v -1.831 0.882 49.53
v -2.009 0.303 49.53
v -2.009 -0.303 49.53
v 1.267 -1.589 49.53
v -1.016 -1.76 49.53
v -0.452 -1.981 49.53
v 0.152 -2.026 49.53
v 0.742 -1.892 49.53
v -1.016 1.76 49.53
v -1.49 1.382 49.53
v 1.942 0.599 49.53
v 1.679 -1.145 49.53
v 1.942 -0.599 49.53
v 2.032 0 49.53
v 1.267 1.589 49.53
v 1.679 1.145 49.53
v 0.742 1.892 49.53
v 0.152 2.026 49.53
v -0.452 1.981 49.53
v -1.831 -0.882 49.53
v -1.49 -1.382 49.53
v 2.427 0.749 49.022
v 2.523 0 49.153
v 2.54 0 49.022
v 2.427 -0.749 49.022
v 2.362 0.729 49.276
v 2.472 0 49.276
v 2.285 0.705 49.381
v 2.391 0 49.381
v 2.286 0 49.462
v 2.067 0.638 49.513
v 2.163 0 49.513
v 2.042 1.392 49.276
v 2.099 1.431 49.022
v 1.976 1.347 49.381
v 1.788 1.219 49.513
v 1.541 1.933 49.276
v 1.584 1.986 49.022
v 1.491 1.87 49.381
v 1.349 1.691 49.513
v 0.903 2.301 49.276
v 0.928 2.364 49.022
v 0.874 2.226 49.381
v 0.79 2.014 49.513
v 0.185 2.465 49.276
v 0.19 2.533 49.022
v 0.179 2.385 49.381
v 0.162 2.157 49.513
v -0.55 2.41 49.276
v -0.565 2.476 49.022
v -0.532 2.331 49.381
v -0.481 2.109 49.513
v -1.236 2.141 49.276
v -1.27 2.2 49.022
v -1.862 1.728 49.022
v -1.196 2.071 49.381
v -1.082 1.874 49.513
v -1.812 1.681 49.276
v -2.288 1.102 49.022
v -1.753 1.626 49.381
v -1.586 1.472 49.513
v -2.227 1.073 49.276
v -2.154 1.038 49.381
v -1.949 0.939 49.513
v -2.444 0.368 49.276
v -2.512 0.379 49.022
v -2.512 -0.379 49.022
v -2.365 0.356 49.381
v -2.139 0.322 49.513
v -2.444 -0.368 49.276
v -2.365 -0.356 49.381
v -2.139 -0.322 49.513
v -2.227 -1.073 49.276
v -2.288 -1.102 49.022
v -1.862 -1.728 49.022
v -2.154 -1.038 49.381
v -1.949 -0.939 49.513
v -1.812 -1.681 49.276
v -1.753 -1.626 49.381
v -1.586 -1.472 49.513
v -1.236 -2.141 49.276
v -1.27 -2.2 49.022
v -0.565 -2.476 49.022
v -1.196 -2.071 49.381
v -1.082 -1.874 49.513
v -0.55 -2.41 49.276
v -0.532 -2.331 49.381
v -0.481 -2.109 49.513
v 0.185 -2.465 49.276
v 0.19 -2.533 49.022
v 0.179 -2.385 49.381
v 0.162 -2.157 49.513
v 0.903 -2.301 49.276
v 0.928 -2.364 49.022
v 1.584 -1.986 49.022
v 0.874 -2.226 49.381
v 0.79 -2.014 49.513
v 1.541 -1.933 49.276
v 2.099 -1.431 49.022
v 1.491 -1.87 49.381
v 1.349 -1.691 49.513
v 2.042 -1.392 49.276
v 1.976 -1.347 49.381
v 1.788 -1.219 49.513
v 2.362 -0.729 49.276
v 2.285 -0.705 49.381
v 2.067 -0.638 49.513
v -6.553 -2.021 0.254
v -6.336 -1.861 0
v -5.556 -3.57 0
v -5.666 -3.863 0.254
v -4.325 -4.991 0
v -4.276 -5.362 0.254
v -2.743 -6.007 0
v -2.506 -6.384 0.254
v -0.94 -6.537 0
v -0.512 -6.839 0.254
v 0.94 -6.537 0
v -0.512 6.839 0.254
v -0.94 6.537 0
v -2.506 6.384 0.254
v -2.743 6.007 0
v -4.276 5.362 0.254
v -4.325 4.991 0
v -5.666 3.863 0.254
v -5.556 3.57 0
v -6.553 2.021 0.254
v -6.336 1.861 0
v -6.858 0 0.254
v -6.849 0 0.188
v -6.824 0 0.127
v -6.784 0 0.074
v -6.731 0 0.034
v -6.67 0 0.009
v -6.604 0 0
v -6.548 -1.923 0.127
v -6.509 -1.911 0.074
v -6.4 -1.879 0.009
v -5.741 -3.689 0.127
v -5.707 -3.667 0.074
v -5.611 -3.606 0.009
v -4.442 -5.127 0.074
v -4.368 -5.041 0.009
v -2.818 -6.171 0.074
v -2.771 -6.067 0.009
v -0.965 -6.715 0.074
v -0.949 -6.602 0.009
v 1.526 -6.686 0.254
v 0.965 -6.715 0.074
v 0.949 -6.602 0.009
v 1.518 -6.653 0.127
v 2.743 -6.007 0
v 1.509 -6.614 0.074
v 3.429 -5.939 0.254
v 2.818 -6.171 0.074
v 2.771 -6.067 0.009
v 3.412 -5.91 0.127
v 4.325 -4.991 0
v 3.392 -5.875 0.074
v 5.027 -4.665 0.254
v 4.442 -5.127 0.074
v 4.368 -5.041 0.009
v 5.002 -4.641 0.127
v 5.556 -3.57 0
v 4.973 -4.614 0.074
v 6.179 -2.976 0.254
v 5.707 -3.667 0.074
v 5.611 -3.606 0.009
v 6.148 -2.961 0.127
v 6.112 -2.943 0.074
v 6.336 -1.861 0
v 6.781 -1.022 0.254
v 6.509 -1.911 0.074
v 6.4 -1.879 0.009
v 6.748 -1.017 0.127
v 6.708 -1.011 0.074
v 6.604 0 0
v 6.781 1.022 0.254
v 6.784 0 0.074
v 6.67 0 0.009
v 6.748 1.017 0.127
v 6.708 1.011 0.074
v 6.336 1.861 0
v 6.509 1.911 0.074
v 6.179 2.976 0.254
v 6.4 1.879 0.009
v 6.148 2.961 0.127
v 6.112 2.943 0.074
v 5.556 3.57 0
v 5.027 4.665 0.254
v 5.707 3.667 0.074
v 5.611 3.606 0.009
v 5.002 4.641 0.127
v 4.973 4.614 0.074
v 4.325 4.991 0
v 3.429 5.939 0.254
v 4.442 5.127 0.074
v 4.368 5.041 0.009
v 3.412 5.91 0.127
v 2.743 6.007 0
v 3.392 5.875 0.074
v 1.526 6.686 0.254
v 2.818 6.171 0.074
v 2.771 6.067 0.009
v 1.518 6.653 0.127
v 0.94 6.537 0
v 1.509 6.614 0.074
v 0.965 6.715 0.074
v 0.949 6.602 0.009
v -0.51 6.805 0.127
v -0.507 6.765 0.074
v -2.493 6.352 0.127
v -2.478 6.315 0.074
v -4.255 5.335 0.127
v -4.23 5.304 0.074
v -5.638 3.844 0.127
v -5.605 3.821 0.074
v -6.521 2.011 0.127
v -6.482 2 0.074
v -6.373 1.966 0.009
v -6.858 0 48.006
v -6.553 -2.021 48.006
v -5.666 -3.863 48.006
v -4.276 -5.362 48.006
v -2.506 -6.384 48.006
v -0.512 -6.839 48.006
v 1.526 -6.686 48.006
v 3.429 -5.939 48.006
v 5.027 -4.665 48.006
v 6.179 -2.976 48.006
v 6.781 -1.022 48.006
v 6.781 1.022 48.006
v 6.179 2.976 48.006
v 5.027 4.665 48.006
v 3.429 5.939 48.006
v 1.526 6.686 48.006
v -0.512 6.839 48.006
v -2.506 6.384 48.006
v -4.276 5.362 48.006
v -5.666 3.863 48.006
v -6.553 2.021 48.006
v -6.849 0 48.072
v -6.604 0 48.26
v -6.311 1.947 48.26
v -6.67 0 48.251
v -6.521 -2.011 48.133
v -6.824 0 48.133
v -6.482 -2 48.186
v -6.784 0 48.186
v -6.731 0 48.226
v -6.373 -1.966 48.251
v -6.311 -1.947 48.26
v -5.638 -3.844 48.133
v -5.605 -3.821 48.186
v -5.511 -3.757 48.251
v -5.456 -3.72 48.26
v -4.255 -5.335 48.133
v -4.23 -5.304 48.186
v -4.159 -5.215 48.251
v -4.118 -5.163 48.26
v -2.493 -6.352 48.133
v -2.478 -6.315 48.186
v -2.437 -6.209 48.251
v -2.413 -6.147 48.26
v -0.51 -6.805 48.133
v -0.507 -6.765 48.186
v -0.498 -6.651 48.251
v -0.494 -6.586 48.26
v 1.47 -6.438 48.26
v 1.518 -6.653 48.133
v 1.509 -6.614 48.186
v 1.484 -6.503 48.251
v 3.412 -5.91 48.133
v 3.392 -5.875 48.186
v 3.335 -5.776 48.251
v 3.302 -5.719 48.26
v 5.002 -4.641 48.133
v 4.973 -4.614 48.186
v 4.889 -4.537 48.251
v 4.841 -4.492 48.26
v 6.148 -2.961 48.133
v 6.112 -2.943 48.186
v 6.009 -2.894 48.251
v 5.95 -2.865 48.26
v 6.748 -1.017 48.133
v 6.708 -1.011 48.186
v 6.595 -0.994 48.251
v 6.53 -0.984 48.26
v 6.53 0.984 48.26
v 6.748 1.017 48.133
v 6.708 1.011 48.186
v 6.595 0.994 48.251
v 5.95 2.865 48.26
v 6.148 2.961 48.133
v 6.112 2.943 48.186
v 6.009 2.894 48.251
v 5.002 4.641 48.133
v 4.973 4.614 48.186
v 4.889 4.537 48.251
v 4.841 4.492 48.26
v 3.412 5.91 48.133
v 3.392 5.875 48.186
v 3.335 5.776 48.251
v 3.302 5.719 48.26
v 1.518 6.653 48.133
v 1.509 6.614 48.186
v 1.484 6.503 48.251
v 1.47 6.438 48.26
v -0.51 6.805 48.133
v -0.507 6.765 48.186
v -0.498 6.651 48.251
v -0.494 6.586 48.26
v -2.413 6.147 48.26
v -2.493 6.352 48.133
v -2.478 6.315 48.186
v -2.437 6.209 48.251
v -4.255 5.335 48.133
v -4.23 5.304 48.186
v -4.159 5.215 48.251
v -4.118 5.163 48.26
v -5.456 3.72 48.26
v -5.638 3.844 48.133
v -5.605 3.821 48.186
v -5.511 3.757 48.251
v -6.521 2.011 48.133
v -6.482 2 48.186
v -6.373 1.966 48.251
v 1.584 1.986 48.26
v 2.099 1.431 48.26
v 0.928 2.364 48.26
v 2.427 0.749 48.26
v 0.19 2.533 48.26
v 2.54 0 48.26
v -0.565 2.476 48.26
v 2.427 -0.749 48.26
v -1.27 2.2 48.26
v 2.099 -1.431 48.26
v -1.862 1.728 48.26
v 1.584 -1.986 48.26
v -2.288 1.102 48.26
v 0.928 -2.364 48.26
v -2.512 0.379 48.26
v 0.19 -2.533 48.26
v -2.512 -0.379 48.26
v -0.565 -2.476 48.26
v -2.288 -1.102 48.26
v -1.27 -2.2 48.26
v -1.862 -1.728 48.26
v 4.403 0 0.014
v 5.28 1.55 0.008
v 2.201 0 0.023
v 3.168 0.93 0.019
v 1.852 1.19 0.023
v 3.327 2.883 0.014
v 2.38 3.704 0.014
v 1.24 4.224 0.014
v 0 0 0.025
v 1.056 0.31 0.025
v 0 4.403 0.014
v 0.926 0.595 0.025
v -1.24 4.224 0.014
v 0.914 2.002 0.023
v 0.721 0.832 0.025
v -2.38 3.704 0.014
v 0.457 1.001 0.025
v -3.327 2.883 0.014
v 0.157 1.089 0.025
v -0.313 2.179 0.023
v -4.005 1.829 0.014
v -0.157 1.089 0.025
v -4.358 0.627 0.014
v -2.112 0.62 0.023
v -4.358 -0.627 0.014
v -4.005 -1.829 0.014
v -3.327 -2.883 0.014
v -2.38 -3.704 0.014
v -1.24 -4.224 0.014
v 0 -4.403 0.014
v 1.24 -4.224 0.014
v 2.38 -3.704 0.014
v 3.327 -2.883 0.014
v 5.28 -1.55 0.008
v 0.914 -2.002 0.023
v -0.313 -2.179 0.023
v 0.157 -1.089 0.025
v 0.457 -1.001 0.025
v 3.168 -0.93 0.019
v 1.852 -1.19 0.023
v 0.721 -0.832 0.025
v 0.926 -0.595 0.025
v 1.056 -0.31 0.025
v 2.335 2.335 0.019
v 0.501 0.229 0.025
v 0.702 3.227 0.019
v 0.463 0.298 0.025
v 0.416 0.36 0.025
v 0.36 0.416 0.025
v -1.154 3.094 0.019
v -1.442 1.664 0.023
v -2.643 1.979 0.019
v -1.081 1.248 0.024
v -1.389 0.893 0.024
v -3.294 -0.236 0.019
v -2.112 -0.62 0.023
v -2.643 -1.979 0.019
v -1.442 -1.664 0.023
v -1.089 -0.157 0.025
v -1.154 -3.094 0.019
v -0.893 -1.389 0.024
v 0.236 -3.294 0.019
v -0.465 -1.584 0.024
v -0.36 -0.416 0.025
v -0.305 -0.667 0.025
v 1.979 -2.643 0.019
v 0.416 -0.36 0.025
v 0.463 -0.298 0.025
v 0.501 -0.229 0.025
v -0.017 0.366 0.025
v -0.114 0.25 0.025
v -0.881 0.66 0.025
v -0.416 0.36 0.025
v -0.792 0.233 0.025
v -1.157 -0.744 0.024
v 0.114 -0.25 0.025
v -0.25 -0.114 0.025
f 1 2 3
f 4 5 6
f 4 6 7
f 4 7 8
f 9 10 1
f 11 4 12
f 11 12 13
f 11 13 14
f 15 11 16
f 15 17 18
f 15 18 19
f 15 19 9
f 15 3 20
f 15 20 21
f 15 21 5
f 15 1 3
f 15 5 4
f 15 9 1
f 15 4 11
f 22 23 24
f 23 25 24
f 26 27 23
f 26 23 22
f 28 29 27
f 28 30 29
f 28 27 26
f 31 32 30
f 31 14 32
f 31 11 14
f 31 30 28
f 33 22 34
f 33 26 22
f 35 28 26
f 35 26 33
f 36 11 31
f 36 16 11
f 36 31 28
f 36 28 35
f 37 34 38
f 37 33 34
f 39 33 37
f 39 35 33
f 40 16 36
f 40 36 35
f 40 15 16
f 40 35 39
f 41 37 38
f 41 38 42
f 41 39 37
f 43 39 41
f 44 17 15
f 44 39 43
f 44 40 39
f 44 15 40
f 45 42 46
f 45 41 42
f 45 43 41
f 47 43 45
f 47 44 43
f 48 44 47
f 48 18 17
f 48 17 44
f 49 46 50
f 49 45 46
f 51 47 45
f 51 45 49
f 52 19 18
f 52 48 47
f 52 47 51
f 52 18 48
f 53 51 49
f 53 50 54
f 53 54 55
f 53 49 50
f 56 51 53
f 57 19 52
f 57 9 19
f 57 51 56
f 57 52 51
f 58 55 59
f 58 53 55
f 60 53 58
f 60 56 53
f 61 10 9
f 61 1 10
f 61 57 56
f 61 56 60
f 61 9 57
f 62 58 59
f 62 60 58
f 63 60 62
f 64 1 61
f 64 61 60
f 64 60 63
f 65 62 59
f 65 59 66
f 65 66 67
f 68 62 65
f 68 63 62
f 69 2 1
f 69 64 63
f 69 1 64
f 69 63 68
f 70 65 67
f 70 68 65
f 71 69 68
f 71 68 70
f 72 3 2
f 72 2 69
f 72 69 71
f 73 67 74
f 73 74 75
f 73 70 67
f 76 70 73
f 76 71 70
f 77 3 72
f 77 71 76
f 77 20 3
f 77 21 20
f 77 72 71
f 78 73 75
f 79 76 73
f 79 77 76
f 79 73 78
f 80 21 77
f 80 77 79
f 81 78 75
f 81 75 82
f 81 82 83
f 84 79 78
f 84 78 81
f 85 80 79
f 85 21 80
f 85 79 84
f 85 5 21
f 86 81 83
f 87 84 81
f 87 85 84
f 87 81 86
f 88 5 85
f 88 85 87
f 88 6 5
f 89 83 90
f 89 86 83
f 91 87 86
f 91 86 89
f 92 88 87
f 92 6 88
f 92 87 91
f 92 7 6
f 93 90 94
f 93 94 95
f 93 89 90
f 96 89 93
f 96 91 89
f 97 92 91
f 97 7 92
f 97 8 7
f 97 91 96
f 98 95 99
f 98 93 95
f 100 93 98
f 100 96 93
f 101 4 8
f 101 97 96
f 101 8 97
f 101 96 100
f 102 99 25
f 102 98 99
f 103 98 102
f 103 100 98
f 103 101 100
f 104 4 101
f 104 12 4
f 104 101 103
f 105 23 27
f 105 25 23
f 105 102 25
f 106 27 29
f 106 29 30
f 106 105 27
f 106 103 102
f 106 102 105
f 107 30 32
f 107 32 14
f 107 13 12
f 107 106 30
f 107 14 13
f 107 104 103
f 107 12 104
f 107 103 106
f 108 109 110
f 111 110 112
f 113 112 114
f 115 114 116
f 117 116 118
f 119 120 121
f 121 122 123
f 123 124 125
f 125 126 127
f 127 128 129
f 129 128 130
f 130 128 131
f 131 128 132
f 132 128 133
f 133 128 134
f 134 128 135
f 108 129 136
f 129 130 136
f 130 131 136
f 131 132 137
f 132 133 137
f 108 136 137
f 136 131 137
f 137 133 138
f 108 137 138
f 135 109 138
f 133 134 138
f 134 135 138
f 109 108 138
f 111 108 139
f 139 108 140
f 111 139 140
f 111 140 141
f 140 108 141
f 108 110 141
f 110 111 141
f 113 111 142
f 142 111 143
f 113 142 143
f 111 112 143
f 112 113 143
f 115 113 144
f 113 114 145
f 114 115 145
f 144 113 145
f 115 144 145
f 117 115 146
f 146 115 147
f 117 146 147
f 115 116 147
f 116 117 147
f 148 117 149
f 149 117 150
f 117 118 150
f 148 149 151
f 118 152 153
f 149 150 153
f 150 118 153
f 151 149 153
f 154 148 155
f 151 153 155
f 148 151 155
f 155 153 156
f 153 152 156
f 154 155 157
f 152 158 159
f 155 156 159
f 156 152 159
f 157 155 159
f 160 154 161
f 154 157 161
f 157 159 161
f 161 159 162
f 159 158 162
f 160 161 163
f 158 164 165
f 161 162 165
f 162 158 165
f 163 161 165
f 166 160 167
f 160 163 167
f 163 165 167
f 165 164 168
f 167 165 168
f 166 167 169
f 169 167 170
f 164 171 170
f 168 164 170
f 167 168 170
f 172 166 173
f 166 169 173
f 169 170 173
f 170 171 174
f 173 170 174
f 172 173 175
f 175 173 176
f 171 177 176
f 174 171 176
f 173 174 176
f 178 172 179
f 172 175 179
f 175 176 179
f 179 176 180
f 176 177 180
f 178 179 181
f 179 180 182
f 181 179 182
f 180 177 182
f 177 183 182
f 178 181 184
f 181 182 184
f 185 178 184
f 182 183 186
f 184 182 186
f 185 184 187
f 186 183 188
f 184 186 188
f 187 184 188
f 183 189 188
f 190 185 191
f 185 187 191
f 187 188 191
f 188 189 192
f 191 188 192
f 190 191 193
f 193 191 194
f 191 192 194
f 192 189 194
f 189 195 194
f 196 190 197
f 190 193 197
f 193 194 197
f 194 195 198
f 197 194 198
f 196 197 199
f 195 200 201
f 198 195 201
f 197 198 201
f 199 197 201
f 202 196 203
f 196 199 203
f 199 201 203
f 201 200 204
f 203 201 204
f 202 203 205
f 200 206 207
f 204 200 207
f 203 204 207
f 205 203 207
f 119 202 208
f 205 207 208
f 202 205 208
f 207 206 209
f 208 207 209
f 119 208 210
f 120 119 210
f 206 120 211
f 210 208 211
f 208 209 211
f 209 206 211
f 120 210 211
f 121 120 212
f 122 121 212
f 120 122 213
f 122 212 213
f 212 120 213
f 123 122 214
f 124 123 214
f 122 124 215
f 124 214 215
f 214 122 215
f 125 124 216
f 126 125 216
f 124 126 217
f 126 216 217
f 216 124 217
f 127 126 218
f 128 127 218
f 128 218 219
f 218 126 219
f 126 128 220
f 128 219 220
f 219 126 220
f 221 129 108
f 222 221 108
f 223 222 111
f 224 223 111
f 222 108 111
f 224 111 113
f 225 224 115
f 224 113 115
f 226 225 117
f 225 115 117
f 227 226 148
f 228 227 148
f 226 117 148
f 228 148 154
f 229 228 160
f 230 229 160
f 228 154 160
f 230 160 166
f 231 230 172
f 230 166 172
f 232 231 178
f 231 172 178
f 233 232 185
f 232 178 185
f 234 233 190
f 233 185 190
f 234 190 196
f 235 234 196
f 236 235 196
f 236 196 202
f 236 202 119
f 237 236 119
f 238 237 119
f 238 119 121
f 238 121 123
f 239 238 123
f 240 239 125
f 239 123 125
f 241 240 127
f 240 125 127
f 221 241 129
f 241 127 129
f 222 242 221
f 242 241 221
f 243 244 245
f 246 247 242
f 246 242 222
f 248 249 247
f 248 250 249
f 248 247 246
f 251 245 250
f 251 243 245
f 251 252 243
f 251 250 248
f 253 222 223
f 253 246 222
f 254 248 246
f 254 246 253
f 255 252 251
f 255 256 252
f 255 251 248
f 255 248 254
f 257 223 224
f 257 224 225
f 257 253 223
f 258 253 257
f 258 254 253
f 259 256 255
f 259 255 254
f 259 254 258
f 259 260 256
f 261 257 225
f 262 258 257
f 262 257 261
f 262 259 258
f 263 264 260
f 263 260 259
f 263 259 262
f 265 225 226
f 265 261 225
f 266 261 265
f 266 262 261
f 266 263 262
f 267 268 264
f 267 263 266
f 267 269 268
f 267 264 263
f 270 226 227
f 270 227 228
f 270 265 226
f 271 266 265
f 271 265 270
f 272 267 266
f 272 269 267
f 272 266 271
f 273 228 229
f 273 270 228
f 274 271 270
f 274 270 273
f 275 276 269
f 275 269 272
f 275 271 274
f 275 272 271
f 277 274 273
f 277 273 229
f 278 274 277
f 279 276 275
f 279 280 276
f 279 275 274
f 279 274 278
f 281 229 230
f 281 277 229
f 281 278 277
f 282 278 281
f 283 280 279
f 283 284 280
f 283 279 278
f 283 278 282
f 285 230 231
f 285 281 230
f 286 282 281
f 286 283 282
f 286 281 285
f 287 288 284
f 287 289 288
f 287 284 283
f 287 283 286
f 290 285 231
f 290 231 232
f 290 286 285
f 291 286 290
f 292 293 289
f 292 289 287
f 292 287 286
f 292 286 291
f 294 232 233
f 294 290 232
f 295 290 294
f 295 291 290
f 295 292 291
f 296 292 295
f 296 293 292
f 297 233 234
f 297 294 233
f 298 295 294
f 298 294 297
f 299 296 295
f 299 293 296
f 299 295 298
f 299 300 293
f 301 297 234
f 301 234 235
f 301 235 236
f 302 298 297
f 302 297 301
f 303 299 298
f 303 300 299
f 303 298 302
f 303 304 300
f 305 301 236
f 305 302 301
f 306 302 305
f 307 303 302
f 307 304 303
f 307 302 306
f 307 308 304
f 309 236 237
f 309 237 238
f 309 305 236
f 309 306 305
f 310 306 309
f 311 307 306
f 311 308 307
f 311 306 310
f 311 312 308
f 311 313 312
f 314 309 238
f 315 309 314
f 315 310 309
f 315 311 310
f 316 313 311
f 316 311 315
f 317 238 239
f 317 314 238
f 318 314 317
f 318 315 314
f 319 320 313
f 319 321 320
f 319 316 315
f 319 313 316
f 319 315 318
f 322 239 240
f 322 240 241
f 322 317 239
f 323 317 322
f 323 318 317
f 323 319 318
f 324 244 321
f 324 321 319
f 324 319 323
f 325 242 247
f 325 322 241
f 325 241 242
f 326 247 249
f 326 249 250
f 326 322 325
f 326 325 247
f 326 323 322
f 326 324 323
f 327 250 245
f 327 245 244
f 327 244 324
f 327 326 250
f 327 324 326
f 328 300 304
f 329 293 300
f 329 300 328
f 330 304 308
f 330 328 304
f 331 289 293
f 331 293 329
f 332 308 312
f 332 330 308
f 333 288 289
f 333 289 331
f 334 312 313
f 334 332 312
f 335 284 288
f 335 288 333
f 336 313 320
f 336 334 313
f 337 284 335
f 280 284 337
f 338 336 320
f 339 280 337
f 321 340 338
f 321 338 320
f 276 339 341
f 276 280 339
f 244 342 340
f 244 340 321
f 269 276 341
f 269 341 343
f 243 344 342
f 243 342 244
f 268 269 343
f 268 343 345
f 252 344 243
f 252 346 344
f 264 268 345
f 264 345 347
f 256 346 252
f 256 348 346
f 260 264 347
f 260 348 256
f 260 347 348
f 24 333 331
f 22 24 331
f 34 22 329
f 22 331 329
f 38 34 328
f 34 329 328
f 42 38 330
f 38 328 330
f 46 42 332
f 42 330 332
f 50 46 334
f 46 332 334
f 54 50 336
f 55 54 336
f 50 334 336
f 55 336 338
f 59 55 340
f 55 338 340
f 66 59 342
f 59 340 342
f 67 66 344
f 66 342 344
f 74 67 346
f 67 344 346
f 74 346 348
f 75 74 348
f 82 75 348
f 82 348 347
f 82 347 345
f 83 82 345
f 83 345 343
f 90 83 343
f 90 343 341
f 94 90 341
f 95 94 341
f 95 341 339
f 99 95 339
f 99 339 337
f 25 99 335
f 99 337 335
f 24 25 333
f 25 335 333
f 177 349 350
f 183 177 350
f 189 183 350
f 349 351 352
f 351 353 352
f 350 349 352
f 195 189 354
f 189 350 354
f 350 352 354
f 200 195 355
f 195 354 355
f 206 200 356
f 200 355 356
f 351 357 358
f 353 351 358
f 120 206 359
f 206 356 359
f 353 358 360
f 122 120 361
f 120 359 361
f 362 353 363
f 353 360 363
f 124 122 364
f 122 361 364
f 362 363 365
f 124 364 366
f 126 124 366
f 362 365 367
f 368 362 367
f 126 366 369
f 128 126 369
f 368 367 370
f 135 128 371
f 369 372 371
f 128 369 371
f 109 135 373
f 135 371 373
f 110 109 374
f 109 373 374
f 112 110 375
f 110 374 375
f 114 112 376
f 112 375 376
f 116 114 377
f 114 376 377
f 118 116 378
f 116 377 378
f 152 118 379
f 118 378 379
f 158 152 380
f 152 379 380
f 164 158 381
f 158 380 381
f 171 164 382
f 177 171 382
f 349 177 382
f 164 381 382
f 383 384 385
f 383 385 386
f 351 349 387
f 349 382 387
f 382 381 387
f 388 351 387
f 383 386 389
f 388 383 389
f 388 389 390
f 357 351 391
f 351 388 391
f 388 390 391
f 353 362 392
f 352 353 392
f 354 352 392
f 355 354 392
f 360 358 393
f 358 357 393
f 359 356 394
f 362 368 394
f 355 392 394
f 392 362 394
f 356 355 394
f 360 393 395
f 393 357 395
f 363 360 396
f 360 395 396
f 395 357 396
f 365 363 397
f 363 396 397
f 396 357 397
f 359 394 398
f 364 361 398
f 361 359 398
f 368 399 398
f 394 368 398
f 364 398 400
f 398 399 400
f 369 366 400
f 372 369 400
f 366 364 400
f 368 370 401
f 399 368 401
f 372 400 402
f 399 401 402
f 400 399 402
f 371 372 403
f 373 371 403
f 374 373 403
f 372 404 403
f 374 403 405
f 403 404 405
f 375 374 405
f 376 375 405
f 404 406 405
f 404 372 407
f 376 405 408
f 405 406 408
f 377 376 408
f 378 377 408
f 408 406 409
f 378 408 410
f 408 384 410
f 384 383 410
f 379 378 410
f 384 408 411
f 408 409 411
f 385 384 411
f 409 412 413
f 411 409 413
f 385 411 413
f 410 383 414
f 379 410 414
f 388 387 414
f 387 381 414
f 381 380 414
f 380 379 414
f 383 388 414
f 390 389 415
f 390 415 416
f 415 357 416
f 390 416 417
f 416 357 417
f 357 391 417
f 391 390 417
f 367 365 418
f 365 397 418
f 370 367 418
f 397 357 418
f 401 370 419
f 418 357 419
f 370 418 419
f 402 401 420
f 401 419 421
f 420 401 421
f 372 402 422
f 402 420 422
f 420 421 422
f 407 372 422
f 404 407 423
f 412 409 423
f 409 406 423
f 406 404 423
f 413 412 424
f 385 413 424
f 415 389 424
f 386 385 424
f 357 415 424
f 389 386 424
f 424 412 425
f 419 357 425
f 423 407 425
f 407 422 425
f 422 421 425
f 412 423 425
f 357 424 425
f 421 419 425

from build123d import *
from OCP.BRepAlgoAPI import BRepAlgoAPI_Cut
from OCP.TopTools import TopTools_ListOfShape

# Parameters (mm, degrees)
SKETCH1_R           = 6.858
BOSS_EXTRUDE1_DEPTH = 48.26
FILLET1_R           = 0.254
SKETCH2_R           = 2.54
BOSS_EXTRUDE2_DEPTH = 1.27
FILLET2_R           = 0.508


with BuildPart() as part:
    # Sketch1 → Boss-Extrude1 (new body)
    with BuildSketch(Plane.XY):
        with Locations(Location((0, 0, 0), (0, 0, 180))):
            Circle(SKETCH1_R)
    extrude(amount=BOSS_EXTRUDE1_DEPTH)

    # Fillet1
    fillet1_edges = [part.edges().sort_by_distance(p)[0] for p in [
        (6.858, 0, 0),
        (6.858, 0, 48.26),
    ]]
    fillet(fillet1_edges, radius=FILLET1_R)

    # Sketch2 → Boss-Extrude2 (add)
    with BuildSketch(Plane.XY.offset(48.26)):
        Circle(SKETCH2_R)
    extrude(amount=BOSS_EXTRUDE2_DEPTH)

    # Fillet2
    fillet2_edges = [part.edges().sort_by_distance(p)[0] for p in [
        (-2.54, 0, 49.53),
    ]]
    fillet(fillet2_edges, radius=FILLET2_R)


with BuildPart() as dome1_tool:
    # Dome1: read off the stored shape, not the designer's step
    # Dome1 outline → Dome1 (revolve)
    with BuildSketch(Plane.XZ):
        with BuildLine():
            Line((0, 0), (6.604000859, -7e-09))
            ThreePointArc((6.604000859, -7e-09), (3.302024852, 0.019049975), (0, 0.0254))
            Line((0, 0.0254), (0, 0))
        make_face()
    revolve(axis=Axis((0, 0, 0), (0, 0, 1)))


with BuildPart() as part_1:
    add(part.part)

    # Dome1: cut by dome1_tool, with a tolerance
    dome1_stock = TopTools_ListOfShape()
    dome1_stock.Append(part_1.part.wrapped)
    dome1_tools = TopTools_ListOfShape()
    dome1_tools.Append(dome1_tool.part.wrapped)
    dome1_cut = BRepAlgoAPI_Cut()
    dome1_cut.SetArguments(dome1_stock)
    dome1_cut.SetTools(dome1_tools)
    dome1_cut.SetFuzzyValue(0.00001)
    dome1_cut.Build()
    add(Compound.cast(dome1_cut.Shape()).solids(), mode=Mode.REPLACE)


solid = part_1.part
